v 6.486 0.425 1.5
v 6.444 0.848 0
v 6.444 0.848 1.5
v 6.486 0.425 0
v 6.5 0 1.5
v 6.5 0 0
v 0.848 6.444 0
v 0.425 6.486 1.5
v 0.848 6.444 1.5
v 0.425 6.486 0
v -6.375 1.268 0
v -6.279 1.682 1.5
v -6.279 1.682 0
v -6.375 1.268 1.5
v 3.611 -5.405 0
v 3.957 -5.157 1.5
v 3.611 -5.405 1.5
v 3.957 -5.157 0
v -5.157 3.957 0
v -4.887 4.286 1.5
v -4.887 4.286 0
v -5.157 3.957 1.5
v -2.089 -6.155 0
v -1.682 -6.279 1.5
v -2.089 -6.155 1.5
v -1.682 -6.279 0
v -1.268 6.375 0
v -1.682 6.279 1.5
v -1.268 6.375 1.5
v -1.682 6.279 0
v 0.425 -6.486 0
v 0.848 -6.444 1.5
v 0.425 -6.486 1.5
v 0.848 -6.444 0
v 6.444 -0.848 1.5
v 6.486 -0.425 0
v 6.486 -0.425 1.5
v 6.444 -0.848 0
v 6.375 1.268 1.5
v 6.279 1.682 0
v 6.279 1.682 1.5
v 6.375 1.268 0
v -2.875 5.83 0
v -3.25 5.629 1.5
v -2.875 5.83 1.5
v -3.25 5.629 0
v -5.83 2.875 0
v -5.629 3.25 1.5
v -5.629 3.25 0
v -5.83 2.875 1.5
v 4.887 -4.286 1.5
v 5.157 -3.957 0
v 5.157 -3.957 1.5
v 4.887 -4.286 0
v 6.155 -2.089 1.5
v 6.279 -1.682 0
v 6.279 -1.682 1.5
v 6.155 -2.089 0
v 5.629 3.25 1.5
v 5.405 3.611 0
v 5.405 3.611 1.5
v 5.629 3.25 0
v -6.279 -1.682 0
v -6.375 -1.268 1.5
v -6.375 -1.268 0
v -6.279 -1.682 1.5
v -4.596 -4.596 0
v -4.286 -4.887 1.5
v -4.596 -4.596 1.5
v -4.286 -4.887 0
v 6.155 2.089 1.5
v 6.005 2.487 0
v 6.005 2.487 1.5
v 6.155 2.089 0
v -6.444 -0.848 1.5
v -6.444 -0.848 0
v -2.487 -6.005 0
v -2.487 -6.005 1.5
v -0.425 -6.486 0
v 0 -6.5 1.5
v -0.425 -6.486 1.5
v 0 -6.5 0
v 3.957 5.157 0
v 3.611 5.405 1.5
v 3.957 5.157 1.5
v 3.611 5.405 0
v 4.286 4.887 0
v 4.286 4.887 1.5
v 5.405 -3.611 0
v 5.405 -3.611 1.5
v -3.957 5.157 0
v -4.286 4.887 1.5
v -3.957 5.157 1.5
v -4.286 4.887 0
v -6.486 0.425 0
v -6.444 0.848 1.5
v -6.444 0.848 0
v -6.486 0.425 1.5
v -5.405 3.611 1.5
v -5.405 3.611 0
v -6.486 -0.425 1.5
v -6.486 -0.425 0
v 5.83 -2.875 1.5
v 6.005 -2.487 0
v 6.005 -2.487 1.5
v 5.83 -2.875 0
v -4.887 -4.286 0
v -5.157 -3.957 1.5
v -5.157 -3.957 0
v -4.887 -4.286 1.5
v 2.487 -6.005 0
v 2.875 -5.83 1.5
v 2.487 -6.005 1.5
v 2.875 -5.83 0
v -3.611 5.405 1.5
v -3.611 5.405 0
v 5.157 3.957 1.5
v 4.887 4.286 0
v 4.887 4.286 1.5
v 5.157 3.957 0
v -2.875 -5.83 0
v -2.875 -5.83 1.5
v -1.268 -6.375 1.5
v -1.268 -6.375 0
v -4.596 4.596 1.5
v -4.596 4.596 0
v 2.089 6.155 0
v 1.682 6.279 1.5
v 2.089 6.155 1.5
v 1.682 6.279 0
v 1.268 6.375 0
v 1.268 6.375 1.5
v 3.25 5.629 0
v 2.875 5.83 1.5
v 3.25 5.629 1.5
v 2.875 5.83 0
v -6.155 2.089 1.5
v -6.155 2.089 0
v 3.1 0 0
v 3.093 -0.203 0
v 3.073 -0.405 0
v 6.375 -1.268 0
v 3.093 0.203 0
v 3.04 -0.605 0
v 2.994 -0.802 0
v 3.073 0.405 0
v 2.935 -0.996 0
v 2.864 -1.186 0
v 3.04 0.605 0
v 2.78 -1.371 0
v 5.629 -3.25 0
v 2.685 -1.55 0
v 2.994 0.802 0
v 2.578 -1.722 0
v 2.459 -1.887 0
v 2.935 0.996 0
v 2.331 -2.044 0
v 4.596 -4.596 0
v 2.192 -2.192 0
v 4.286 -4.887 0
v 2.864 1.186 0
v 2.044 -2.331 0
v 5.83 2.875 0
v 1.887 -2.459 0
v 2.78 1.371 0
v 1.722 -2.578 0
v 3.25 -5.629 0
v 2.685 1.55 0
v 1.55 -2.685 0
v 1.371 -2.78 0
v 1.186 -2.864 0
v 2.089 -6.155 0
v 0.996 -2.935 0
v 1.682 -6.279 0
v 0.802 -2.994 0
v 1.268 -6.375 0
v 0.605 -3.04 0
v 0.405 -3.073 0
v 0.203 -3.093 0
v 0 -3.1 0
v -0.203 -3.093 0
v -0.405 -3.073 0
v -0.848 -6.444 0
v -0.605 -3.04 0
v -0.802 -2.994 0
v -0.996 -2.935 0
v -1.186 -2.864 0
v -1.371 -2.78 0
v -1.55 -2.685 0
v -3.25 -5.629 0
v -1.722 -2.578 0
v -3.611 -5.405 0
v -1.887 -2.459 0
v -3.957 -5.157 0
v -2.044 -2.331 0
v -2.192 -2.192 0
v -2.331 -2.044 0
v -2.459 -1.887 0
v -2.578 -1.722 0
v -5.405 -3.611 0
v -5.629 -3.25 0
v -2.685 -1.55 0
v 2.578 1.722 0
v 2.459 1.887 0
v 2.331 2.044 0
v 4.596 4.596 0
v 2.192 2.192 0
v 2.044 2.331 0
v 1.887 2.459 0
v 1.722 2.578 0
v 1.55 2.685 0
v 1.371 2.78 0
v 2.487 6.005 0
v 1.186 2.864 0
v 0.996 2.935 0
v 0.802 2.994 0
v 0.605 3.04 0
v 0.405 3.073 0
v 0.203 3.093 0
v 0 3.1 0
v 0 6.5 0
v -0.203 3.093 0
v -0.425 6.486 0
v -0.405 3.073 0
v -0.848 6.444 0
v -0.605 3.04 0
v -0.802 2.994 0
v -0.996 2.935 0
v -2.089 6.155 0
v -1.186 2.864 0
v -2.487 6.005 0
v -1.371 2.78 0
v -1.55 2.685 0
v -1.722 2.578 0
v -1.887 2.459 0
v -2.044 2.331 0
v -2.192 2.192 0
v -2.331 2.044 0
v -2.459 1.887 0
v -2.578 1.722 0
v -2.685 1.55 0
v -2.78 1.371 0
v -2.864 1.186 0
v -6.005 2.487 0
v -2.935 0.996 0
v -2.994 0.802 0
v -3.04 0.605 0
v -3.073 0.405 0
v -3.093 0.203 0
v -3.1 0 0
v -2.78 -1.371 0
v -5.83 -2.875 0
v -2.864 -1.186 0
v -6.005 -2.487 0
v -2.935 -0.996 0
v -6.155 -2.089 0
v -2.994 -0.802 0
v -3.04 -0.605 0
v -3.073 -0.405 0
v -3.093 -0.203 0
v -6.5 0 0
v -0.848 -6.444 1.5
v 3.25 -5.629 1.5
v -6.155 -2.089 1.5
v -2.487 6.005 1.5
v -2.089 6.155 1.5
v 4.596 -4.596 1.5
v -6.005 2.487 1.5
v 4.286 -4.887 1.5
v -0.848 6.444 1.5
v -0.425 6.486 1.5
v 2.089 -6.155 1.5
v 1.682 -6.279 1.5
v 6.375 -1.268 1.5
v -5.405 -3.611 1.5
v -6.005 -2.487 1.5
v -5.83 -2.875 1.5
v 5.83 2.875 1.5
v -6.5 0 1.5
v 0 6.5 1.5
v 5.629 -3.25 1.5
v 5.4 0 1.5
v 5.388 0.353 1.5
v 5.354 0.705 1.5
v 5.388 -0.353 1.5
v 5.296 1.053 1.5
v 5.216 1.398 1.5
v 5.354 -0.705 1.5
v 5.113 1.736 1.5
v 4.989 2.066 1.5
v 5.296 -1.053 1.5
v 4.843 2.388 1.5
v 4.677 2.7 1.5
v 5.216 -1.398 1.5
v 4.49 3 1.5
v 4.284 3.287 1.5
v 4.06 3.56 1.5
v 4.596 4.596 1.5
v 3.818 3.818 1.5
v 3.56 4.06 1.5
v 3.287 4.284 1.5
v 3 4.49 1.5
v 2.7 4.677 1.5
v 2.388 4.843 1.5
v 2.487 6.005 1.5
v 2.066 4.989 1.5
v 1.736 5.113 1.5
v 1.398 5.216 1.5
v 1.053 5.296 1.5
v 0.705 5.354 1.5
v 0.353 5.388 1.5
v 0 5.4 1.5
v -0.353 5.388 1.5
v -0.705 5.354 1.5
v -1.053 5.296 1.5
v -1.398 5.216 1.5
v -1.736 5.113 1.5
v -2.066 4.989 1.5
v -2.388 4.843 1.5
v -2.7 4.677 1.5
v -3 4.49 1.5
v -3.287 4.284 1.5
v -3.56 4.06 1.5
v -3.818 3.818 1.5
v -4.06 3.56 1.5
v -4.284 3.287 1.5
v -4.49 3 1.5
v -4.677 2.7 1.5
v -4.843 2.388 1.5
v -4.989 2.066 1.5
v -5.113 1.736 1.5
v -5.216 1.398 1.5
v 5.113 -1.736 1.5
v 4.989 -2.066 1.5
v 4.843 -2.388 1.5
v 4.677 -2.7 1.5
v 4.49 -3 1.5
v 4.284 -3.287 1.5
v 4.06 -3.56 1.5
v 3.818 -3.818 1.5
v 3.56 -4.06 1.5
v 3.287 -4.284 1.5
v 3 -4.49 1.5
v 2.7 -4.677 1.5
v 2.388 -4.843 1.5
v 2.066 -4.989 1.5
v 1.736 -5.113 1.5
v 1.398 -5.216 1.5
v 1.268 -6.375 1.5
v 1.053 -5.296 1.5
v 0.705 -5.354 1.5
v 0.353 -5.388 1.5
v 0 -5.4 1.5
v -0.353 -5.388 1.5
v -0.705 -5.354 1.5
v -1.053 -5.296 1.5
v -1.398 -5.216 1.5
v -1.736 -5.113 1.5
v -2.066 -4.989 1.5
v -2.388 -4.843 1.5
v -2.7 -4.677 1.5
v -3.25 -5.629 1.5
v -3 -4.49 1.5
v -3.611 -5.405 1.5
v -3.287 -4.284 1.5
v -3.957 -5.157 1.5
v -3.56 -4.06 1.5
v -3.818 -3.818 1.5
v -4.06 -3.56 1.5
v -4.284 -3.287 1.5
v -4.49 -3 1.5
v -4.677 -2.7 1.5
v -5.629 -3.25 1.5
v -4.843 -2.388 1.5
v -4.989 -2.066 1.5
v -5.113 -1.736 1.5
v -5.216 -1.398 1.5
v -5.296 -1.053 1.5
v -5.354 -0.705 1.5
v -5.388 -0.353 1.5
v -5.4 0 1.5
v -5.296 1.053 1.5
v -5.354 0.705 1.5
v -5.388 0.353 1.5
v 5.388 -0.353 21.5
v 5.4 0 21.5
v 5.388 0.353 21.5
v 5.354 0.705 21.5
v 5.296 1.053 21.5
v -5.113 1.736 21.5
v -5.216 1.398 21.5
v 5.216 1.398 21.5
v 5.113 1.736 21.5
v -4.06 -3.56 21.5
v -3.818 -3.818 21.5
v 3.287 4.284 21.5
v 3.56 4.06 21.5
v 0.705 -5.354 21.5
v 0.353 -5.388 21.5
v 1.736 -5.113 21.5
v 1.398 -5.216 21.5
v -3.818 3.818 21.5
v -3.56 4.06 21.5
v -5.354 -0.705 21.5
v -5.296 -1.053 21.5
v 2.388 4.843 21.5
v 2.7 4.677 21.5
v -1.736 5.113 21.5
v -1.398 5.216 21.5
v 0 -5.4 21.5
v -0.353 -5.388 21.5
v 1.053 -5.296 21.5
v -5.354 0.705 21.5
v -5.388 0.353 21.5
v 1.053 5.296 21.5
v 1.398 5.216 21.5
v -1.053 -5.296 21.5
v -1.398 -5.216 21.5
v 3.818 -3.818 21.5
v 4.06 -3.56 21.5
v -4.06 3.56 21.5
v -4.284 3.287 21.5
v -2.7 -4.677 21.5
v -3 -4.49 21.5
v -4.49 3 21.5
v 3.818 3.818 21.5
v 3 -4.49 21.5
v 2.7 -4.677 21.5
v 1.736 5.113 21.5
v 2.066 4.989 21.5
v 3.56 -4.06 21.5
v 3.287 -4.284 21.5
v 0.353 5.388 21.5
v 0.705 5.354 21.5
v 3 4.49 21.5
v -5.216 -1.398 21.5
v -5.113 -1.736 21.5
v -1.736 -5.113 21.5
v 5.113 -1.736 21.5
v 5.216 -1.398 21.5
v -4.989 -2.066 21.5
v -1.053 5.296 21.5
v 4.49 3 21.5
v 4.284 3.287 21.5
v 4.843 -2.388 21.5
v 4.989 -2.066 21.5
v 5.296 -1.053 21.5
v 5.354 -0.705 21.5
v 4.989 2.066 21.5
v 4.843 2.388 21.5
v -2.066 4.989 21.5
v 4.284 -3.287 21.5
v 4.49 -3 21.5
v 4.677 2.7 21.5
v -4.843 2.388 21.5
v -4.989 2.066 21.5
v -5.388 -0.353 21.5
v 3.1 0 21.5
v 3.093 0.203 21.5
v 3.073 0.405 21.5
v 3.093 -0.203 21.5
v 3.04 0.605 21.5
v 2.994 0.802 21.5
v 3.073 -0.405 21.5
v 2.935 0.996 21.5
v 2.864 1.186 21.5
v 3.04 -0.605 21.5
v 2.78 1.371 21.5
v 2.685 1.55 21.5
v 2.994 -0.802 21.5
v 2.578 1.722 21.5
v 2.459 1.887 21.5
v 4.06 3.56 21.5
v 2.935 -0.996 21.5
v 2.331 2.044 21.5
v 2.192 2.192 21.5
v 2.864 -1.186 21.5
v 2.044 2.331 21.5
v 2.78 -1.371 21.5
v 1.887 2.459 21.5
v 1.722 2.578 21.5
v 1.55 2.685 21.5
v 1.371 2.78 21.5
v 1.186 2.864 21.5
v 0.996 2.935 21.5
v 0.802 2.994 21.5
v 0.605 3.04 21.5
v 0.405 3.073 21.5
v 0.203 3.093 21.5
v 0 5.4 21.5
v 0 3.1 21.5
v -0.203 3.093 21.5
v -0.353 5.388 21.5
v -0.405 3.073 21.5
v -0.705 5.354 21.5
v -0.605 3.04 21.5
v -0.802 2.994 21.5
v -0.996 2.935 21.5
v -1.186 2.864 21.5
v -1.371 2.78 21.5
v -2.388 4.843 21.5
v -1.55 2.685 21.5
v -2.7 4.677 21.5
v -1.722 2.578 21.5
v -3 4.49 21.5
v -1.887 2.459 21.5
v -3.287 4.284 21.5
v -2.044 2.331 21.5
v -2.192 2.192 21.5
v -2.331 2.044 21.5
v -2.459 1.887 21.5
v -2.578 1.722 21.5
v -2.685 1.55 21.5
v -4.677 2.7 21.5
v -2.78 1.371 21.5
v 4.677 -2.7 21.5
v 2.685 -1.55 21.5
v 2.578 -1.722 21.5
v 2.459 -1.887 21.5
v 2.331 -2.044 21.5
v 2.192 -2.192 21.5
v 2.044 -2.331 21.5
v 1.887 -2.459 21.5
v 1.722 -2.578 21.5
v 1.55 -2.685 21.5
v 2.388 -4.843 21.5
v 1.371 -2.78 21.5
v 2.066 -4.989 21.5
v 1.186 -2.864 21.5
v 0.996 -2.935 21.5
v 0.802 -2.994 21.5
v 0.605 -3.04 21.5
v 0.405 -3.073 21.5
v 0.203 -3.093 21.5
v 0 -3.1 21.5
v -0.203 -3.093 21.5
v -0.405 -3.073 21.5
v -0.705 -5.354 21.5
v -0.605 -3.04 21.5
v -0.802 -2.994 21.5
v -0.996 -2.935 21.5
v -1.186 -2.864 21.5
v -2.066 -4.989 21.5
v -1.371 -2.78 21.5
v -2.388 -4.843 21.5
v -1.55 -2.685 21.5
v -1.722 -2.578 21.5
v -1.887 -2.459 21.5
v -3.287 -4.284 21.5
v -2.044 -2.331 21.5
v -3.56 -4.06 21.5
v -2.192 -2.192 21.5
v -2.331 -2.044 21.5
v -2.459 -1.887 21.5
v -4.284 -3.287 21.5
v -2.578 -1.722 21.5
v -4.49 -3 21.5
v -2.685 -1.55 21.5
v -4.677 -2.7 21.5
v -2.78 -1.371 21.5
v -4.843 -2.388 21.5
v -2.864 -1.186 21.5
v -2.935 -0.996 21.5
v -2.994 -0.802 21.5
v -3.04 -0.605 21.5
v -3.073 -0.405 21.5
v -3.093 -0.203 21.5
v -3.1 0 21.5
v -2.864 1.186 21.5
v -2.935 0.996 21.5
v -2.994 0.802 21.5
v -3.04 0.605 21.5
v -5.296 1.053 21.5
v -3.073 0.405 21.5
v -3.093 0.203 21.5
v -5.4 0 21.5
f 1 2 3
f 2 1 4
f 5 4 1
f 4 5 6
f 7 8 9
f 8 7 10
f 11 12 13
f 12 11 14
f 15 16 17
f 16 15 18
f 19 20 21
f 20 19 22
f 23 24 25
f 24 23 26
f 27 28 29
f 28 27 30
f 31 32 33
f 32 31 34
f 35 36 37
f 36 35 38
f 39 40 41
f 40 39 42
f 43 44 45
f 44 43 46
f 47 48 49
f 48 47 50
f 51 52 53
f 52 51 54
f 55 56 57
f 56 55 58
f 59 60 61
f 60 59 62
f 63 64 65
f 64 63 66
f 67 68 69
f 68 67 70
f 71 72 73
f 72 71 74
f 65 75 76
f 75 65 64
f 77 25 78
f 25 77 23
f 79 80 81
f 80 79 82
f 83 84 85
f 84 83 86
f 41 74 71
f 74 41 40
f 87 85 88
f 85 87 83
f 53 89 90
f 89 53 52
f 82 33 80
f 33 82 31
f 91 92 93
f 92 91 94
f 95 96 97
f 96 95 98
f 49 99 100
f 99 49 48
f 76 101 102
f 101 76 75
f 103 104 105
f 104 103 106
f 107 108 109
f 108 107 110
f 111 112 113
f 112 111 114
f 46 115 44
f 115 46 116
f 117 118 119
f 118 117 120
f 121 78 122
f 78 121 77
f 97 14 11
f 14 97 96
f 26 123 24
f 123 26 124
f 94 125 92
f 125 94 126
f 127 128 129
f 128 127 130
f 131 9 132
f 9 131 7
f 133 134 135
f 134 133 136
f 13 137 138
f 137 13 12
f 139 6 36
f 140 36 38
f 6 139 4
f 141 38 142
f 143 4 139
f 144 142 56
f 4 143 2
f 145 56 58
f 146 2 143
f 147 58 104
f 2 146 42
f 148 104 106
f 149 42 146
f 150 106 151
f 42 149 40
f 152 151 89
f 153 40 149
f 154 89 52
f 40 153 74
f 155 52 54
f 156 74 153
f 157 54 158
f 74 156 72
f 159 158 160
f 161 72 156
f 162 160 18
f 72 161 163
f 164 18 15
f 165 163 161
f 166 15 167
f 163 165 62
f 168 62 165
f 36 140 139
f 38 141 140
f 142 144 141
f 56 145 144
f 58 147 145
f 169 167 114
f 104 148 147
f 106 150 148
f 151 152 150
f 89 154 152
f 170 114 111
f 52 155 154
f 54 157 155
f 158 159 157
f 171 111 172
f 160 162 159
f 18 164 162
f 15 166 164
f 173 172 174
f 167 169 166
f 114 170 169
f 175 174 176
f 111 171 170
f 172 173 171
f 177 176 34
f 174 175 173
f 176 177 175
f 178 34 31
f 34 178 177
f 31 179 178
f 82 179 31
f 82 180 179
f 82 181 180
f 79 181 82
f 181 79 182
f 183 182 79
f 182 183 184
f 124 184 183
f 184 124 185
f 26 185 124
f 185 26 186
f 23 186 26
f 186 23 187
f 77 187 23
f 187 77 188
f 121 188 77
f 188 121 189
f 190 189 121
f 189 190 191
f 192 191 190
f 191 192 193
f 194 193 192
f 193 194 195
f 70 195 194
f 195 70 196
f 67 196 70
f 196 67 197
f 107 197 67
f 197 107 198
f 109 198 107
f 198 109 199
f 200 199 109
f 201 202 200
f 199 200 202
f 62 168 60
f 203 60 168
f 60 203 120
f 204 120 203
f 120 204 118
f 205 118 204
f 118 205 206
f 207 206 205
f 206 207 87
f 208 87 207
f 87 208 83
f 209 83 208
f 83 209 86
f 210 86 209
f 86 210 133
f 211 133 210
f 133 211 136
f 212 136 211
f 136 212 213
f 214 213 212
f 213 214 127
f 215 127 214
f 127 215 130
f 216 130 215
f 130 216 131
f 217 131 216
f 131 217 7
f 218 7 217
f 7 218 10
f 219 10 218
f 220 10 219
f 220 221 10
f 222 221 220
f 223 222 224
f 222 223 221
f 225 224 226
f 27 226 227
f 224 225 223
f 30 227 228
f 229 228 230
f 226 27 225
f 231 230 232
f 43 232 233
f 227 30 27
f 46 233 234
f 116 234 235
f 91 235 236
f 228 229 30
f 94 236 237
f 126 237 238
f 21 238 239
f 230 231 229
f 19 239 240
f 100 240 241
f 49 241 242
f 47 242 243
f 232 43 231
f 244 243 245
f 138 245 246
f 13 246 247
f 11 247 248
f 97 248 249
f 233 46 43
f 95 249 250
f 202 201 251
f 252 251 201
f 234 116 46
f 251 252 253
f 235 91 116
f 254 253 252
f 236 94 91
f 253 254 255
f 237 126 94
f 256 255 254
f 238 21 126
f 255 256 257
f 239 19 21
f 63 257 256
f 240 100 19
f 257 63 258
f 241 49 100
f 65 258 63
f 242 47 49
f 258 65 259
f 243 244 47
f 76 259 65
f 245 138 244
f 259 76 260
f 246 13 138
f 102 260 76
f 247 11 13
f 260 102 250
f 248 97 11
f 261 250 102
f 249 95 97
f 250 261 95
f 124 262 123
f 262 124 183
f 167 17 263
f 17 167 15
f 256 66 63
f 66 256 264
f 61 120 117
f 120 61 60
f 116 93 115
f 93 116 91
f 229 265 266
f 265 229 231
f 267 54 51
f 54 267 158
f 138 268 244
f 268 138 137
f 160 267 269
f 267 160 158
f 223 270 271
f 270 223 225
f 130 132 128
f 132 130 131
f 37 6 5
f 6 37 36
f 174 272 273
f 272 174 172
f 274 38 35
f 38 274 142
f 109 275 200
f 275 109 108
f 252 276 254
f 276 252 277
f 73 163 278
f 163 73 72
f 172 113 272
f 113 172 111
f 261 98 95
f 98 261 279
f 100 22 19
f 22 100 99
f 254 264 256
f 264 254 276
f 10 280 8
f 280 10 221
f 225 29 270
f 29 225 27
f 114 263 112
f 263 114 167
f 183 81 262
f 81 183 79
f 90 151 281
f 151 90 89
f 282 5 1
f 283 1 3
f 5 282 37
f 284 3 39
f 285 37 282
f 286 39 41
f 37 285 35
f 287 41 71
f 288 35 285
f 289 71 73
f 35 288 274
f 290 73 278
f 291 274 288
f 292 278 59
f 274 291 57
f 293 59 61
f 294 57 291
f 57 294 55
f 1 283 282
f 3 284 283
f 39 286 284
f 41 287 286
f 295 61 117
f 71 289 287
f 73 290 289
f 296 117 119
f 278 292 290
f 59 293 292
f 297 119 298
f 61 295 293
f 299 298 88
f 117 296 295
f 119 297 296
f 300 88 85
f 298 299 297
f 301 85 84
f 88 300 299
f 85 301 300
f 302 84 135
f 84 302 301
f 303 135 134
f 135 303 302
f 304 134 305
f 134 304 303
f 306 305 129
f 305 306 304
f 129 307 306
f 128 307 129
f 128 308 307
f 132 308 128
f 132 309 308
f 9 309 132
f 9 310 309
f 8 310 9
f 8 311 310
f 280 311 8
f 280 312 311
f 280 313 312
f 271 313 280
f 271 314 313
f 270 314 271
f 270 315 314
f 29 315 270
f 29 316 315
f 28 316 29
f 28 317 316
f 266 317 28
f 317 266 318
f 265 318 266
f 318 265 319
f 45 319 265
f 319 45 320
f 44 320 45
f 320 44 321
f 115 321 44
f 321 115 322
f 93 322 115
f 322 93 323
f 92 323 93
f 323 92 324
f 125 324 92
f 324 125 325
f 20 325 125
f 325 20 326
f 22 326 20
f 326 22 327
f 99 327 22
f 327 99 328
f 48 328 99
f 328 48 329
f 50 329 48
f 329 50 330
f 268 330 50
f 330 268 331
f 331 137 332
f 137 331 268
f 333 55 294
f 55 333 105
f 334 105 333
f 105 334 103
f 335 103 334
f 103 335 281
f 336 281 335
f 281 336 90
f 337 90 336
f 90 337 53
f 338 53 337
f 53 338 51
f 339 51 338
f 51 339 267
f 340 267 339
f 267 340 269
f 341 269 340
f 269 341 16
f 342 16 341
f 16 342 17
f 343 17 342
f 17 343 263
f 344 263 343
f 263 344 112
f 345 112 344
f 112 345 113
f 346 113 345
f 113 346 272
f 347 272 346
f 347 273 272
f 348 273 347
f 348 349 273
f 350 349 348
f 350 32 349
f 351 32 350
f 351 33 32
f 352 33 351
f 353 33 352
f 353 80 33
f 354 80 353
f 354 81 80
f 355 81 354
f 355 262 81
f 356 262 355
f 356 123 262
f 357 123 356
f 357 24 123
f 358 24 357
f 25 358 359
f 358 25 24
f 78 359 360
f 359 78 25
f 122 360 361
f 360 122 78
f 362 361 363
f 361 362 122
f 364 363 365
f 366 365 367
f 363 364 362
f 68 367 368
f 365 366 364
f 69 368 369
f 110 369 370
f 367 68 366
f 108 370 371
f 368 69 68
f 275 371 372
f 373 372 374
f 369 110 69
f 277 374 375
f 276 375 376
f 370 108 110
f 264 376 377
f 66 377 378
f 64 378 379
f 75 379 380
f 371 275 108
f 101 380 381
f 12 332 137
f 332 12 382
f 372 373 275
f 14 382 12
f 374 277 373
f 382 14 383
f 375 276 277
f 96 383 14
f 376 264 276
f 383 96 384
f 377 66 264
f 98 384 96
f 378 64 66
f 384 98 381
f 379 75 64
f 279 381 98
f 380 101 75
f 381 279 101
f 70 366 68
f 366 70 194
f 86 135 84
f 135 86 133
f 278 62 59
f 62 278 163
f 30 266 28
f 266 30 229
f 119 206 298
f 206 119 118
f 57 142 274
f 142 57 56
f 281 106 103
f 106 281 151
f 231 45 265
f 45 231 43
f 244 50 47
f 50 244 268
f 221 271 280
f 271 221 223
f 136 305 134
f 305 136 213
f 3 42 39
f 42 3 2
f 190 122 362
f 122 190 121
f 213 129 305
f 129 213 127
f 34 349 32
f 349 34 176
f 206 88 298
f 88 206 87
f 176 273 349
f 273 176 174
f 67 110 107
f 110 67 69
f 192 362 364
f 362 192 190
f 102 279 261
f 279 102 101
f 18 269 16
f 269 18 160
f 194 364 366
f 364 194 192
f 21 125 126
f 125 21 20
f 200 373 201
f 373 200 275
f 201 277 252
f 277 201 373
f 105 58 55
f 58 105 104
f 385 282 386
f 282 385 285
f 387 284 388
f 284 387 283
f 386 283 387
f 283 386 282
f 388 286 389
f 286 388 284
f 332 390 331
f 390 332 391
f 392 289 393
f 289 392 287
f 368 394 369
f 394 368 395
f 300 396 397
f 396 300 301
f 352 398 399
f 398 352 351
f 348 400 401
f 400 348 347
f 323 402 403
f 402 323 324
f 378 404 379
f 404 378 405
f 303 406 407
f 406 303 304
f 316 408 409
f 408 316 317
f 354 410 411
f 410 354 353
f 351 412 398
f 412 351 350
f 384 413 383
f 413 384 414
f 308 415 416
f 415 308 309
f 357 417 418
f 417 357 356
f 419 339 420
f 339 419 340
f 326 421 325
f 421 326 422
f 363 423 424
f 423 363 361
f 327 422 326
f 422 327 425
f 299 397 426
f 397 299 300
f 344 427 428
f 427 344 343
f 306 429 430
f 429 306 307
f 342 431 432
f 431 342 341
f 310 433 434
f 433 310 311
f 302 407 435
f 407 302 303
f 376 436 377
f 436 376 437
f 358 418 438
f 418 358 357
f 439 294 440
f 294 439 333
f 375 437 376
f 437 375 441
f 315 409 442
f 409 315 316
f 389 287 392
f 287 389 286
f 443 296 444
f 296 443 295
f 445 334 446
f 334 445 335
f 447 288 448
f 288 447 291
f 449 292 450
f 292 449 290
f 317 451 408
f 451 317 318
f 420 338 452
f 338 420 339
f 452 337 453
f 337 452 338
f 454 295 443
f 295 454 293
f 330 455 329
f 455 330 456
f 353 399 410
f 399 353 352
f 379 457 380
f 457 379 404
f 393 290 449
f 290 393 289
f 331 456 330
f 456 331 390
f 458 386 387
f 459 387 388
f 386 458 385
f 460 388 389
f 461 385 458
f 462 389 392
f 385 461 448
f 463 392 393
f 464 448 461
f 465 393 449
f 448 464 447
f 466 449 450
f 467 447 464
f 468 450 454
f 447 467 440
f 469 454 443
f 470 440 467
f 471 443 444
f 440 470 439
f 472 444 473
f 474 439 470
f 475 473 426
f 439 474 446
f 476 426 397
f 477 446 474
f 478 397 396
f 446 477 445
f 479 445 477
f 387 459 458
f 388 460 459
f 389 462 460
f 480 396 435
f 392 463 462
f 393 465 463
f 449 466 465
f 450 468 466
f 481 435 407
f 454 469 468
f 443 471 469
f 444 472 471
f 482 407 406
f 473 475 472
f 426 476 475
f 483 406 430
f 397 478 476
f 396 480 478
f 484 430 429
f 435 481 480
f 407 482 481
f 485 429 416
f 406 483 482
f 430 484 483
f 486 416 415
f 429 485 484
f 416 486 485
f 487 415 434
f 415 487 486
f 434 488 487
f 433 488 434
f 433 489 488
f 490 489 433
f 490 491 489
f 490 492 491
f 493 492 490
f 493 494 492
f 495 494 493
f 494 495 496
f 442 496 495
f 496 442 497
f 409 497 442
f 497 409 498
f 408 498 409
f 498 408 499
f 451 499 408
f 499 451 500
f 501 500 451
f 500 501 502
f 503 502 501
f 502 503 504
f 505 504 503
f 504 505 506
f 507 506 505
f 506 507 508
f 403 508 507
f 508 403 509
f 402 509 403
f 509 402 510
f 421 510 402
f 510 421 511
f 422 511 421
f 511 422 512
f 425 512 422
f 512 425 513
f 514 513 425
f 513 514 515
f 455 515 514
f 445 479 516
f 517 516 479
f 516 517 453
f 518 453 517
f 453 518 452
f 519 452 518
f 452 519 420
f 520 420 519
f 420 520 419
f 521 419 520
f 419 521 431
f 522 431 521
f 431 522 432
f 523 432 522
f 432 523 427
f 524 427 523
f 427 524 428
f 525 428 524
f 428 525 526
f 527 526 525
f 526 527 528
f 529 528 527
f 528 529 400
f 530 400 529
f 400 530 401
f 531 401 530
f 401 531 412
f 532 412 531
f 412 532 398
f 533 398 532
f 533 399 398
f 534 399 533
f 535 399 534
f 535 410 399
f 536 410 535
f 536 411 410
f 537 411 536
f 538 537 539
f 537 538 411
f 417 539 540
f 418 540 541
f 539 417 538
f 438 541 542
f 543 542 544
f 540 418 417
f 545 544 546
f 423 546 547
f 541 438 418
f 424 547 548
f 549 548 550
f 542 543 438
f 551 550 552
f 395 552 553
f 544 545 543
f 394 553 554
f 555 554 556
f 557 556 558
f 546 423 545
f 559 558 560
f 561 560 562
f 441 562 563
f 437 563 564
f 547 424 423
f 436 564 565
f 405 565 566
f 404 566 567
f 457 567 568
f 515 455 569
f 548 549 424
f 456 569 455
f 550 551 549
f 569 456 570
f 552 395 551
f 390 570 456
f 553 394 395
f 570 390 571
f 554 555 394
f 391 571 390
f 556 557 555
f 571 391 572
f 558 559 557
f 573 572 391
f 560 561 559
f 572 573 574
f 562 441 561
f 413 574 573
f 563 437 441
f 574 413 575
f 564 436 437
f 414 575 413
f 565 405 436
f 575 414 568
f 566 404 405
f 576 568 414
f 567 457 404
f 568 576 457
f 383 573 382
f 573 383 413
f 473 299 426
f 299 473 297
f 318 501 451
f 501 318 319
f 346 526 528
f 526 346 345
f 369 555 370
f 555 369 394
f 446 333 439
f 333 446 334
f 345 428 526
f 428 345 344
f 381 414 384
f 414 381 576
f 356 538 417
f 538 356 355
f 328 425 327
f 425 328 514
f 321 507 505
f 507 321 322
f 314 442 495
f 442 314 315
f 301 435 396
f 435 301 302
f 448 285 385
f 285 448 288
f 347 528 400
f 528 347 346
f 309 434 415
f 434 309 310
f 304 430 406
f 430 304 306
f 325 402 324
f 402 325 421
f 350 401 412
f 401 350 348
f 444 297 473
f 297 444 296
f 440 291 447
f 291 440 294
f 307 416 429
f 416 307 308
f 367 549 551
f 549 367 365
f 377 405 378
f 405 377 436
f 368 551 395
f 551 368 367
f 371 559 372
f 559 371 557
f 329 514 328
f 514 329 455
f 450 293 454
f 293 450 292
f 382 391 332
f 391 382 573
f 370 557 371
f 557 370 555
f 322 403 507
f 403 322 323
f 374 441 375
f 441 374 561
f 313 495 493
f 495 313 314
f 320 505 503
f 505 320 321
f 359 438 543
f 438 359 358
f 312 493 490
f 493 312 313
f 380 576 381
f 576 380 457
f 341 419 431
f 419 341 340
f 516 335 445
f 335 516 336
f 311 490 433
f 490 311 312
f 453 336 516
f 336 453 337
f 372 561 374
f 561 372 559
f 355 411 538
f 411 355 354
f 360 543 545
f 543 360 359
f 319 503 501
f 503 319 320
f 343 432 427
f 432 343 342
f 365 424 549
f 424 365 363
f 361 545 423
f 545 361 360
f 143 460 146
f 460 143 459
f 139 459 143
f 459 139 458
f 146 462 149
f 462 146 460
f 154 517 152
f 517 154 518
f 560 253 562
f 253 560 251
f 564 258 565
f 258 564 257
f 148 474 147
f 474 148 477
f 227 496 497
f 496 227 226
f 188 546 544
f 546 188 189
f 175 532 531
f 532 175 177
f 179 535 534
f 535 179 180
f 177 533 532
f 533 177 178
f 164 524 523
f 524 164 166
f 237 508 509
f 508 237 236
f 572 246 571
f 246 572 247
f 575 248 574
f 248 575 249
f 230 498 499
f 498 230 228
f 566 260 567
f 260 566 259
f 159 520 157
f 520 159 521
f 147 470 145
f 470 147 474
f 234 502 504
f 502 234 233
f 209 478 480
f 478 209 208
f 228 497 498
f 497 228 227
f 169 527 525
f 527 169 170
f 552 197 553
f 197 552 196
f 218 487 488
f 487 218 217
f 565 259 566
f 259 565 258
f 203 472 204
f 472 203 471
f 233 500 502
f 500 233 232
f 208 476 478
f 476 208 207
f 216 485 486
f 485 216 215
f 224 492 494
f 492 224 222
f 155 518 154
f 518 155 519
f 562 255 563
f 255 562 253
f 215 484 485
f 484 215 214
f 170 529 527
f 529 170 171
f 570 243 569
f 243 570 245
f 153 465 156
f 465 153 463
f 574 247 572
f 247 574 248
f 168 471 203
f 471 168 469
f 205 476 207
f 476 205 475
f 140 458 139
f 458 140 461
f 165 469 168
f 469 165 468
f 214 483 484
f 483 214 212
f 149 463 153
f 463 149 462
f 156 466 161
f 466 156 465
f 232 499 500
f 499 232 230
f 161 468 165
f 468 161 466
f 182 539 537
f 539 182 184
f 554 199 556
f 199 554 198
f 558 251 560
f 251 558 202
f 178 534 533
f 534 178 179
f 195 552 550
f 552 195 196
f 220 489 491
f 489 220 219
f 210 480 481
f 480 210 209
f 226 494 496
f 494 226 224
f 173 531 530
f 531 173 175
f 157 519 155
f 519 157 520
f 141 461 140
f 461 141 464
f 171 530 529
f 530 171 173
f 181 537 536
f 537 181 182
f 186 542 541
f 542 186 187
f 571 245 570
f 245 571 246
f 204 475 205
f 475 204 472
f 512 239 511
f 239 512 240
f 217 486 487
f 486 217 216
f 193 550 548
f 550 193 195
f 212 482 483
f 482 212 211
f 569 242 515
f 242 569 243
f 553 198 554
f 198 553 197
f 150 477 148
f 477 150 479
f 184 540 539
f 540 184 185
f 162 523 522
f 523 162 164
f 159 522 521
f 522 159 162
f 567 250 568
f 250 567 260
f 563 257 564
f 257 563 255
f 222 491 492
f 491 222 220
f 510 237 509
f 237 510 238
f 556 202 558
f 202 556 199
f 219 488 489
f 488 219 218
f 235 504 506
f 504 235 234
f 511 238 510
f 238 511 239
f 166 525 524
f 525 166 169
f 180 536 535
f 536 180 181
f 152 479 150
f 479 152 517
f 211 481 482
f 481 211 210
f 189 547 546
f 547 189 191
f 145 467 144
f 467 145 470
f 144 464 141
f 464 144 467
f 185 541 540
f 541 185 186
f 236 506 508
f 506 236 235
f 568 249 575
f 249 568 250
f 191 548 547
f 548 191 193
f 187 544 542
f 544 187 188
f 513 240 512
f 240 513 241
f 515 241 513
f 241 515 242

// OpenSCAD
// PCR tube adapter sleeve - print upside down
// Units: mm

// ---- Dimensions ----
collar_d        = 13;    // collar outer diameter
collar_t        = 1.5;   // collar thickness (z = 0 to 1.5)
sleeve_od       = 10.8;  // sleeve outer diameter
sleeve_h        = 21.5;  // sleeve total height (z = 0 to 21.5)
bore_d          = 6.2;   // through-bore diameter
eps             = 0.5;   // cutter overshoot past faces

$fn = 96;

// ---- Model ----
difference() {
    union() {
        // Collar on the bed
        cylinder(d = collar_d, h = collar_t);
        // Sleeve body rising from the collar
        translate([0, 0, collar_t])
            cylinder(d = sleeve_od, h = sleeve_h - collar_t);
    }
    // Full-height bore, open at both ends
    translate([0, 0, -eps])
        cylinder(d = bore_d, h = sleeve_h + 2 * eps);
}
